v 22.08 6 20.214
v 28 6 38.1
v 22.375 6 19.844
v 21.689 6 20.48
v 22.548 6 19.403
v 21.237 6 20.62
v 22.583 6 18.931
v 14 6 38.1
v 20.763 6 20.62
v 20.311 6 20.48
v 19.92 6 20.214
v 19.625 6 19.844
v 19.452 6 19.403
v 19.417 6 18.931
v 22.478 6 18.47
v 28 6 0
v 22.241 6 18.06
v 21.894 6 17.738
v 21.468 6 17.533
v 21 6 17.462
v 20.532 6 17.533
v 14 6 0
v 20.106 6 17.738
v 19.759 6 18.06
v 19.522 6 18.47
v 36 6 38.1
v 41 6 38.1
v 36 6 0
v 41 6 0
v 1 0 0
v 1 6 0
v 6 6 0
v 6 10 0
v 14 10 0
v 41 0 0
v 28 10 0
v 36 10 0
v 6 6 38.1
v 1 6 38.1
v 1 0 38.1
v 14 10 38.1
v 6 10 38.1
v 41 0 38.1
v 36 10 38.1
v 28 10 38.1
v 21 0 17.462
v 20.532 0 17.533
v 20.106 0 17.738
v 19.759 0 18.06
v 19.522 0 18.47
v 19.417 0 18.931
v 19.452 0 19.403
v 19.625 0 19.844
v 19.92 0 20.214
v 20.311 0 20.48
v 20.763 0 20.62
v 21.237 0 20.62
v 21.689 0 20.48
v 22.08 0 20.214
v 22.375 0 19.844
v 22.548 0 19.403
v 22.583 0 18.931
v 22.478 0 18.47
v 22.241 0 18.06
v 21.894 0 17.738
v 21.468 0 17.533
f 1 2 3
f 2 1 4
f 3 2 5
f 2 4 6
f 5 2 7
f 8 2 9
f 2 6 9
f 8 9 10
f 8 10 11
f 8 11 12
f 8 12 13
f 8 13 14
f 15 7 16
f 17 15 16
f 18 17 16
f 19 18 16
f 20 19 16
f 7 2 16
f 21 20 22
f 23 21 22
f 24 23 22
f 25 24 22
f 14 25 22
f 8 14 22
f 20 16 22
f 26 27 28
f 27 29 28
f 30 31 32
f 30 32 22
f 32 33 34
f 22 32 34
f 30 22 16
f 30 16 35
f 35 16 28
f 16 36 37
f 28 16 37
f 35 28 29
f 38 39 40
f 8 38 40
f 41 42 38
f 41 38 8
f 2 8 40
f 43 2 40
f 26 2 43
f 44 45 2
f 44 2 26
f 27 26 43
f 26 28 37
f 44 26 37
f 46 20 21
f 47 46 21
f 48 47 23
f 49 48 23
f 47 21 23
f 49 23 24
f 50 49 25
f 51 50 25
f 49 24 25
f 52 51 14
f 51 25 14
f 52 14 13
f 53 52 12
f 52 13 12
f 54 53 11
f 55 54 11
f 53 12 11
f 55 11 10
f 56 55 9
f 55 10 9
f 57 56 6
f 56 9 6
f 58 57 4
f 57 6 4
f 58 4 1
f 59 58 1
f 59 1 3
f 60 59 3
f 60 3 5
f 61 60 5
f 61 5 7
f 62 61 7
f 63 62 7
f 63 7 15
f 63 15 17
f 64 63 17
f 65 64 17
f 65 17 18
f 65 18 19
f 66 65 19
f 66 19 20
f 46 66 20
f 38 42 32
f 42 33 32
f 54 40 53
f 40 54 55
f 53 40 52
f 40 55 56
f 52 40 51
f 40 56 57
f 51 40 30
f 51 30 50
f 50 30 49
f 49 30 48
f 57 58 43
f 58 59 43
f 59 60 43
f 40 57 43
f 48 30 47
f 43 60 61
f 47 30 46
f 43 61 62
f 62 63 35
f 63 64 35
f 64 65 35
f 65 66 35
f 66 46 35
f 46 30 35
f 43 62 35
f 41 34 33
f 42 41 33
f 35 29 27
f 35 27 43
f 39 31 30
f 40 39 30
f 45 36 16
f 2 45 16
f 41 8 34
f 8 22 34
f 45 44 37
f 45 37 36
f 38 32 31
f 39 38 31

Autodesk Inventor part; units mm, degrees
ref_plane "YZ Plane" through (0, 0, 0) normal (1, 0, 0) x (0, 1, 0)
ref_plane "XZ Plane" through (0, 0, 0) normal (0, 1, 0) x (-1, 0, 0)
ref_plane "XY Plane" through (0, 0, 0) normal (0, 0, 1) x (1, 0, 0)
sketch "Sketch1" plane through (0, 0, 0) normal (0, 0, 1) x (1, 0, 0)
  line L0 (0, 0) -> (42, 0)
  line L1 (42, 0) -> (42, 6)
  line L2 (42, 6) -> (0, 6)
  line L3 (0, 6) -> (0, 0)
  line L4 (6, 6) -> (14, 6)
  line L5 (14, 6) -> (14, 10)
  line L6 (14, 10) -> (6, 10)
  line L7 (6, 10) -> (6, 6)
  line L8 (28, 6) -> (36, 6)
  line L9 (36, 6) -> (36, 10)
  line L10 (36, 10) -> (28, 10)
  line L11 (28, 10) -> (28, 6)
  dimension "d0" = 42
  dimension "d1" = 6
  dimension "d2" = 4
  dimension "d3" = 8
  dimension "d4" = 8
  dimension "d5" = 6
  dimension "d6" = 6
extrude "Extrusion1" add sketch "Sketch1" along normal blind 38.1
sketch "Sketch2" plane through (0, 0, 0) normal (0, -1, 0) x (1, 0, 0)
  line L0 (0, 0) -> (42, 0) projected
  line L1 (0, 0) -> (0, 38.1) projected
  point P0 (21, 19.05)
  dimension "d9" = 19.05
  dimension "d10" = 21
hole "Hole1" at (21, 0, 19.05) direction (0, 1, 0) diameter 3.175 end through all
sketch "Sketch3" plane through (0, 0, 38.1) normal (0, 0, 1) x (1, 0, 0)
  line L0 (0, 0) -> (42, 0) projected
  line L1 (0, 6) -> (1, 6)
  line L2 (1, 6) -> (1, 0)
  line L3 (1, 0) -> (0, 0)
  line L4 (0, 0) -> (0, 6)
  line L5 (42, 6) -> (41, 6)
  line L6 (41, 6) -> (41, 0)
  line L7 (41, 0) -> (42, 0)
  line L8 (42, 0) -> (42, 6)
  dimension "d18" = 1
  dimension "d19" = 1
extrude "Extrusion2" cut sketch "Sketch3" against normal blind 50.8
equation "\"d4\" = d3"
equation "\"d6\" = d5"
properties part number "Slider" material "PET Plastic"
